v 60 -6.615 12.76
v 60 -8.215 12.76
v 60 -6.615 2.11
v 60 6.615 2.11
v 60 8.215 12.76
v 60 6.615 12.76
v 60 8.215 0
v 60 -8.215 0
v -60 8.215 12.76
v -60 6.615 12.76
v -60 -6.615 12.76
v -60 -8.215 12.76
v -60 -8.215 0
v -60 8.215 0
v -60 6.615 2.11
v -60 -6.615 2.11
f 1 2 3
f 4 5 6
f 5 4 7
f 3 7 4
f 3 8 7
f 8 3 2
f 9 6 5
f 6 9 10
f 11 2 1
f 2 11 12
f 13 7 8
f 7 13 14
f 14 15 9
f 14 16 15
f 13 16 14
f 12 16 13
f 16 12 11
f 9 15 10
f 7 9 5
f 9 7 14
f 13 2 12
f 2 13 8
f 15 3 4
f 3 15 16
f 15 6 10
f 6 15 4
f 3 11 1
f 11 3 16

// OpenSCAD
// generate C-channel for later use in cut-outs

mW = 16.33;
mH = 12.66;
L = 120;
pad=.1;
W = mW+pad;
H = mH+pad;
block = [L,W,H];
cutW = (1.5 * 2) + (pad * 2);
cutH = (2.0 + pad);

translate([0,0,H/2])
difference(){
	cube(block, center=true);
	
	translate([0,0,cutH/2+.01])
		cube([L,W-cutW, H-cutH], center=true);
}
